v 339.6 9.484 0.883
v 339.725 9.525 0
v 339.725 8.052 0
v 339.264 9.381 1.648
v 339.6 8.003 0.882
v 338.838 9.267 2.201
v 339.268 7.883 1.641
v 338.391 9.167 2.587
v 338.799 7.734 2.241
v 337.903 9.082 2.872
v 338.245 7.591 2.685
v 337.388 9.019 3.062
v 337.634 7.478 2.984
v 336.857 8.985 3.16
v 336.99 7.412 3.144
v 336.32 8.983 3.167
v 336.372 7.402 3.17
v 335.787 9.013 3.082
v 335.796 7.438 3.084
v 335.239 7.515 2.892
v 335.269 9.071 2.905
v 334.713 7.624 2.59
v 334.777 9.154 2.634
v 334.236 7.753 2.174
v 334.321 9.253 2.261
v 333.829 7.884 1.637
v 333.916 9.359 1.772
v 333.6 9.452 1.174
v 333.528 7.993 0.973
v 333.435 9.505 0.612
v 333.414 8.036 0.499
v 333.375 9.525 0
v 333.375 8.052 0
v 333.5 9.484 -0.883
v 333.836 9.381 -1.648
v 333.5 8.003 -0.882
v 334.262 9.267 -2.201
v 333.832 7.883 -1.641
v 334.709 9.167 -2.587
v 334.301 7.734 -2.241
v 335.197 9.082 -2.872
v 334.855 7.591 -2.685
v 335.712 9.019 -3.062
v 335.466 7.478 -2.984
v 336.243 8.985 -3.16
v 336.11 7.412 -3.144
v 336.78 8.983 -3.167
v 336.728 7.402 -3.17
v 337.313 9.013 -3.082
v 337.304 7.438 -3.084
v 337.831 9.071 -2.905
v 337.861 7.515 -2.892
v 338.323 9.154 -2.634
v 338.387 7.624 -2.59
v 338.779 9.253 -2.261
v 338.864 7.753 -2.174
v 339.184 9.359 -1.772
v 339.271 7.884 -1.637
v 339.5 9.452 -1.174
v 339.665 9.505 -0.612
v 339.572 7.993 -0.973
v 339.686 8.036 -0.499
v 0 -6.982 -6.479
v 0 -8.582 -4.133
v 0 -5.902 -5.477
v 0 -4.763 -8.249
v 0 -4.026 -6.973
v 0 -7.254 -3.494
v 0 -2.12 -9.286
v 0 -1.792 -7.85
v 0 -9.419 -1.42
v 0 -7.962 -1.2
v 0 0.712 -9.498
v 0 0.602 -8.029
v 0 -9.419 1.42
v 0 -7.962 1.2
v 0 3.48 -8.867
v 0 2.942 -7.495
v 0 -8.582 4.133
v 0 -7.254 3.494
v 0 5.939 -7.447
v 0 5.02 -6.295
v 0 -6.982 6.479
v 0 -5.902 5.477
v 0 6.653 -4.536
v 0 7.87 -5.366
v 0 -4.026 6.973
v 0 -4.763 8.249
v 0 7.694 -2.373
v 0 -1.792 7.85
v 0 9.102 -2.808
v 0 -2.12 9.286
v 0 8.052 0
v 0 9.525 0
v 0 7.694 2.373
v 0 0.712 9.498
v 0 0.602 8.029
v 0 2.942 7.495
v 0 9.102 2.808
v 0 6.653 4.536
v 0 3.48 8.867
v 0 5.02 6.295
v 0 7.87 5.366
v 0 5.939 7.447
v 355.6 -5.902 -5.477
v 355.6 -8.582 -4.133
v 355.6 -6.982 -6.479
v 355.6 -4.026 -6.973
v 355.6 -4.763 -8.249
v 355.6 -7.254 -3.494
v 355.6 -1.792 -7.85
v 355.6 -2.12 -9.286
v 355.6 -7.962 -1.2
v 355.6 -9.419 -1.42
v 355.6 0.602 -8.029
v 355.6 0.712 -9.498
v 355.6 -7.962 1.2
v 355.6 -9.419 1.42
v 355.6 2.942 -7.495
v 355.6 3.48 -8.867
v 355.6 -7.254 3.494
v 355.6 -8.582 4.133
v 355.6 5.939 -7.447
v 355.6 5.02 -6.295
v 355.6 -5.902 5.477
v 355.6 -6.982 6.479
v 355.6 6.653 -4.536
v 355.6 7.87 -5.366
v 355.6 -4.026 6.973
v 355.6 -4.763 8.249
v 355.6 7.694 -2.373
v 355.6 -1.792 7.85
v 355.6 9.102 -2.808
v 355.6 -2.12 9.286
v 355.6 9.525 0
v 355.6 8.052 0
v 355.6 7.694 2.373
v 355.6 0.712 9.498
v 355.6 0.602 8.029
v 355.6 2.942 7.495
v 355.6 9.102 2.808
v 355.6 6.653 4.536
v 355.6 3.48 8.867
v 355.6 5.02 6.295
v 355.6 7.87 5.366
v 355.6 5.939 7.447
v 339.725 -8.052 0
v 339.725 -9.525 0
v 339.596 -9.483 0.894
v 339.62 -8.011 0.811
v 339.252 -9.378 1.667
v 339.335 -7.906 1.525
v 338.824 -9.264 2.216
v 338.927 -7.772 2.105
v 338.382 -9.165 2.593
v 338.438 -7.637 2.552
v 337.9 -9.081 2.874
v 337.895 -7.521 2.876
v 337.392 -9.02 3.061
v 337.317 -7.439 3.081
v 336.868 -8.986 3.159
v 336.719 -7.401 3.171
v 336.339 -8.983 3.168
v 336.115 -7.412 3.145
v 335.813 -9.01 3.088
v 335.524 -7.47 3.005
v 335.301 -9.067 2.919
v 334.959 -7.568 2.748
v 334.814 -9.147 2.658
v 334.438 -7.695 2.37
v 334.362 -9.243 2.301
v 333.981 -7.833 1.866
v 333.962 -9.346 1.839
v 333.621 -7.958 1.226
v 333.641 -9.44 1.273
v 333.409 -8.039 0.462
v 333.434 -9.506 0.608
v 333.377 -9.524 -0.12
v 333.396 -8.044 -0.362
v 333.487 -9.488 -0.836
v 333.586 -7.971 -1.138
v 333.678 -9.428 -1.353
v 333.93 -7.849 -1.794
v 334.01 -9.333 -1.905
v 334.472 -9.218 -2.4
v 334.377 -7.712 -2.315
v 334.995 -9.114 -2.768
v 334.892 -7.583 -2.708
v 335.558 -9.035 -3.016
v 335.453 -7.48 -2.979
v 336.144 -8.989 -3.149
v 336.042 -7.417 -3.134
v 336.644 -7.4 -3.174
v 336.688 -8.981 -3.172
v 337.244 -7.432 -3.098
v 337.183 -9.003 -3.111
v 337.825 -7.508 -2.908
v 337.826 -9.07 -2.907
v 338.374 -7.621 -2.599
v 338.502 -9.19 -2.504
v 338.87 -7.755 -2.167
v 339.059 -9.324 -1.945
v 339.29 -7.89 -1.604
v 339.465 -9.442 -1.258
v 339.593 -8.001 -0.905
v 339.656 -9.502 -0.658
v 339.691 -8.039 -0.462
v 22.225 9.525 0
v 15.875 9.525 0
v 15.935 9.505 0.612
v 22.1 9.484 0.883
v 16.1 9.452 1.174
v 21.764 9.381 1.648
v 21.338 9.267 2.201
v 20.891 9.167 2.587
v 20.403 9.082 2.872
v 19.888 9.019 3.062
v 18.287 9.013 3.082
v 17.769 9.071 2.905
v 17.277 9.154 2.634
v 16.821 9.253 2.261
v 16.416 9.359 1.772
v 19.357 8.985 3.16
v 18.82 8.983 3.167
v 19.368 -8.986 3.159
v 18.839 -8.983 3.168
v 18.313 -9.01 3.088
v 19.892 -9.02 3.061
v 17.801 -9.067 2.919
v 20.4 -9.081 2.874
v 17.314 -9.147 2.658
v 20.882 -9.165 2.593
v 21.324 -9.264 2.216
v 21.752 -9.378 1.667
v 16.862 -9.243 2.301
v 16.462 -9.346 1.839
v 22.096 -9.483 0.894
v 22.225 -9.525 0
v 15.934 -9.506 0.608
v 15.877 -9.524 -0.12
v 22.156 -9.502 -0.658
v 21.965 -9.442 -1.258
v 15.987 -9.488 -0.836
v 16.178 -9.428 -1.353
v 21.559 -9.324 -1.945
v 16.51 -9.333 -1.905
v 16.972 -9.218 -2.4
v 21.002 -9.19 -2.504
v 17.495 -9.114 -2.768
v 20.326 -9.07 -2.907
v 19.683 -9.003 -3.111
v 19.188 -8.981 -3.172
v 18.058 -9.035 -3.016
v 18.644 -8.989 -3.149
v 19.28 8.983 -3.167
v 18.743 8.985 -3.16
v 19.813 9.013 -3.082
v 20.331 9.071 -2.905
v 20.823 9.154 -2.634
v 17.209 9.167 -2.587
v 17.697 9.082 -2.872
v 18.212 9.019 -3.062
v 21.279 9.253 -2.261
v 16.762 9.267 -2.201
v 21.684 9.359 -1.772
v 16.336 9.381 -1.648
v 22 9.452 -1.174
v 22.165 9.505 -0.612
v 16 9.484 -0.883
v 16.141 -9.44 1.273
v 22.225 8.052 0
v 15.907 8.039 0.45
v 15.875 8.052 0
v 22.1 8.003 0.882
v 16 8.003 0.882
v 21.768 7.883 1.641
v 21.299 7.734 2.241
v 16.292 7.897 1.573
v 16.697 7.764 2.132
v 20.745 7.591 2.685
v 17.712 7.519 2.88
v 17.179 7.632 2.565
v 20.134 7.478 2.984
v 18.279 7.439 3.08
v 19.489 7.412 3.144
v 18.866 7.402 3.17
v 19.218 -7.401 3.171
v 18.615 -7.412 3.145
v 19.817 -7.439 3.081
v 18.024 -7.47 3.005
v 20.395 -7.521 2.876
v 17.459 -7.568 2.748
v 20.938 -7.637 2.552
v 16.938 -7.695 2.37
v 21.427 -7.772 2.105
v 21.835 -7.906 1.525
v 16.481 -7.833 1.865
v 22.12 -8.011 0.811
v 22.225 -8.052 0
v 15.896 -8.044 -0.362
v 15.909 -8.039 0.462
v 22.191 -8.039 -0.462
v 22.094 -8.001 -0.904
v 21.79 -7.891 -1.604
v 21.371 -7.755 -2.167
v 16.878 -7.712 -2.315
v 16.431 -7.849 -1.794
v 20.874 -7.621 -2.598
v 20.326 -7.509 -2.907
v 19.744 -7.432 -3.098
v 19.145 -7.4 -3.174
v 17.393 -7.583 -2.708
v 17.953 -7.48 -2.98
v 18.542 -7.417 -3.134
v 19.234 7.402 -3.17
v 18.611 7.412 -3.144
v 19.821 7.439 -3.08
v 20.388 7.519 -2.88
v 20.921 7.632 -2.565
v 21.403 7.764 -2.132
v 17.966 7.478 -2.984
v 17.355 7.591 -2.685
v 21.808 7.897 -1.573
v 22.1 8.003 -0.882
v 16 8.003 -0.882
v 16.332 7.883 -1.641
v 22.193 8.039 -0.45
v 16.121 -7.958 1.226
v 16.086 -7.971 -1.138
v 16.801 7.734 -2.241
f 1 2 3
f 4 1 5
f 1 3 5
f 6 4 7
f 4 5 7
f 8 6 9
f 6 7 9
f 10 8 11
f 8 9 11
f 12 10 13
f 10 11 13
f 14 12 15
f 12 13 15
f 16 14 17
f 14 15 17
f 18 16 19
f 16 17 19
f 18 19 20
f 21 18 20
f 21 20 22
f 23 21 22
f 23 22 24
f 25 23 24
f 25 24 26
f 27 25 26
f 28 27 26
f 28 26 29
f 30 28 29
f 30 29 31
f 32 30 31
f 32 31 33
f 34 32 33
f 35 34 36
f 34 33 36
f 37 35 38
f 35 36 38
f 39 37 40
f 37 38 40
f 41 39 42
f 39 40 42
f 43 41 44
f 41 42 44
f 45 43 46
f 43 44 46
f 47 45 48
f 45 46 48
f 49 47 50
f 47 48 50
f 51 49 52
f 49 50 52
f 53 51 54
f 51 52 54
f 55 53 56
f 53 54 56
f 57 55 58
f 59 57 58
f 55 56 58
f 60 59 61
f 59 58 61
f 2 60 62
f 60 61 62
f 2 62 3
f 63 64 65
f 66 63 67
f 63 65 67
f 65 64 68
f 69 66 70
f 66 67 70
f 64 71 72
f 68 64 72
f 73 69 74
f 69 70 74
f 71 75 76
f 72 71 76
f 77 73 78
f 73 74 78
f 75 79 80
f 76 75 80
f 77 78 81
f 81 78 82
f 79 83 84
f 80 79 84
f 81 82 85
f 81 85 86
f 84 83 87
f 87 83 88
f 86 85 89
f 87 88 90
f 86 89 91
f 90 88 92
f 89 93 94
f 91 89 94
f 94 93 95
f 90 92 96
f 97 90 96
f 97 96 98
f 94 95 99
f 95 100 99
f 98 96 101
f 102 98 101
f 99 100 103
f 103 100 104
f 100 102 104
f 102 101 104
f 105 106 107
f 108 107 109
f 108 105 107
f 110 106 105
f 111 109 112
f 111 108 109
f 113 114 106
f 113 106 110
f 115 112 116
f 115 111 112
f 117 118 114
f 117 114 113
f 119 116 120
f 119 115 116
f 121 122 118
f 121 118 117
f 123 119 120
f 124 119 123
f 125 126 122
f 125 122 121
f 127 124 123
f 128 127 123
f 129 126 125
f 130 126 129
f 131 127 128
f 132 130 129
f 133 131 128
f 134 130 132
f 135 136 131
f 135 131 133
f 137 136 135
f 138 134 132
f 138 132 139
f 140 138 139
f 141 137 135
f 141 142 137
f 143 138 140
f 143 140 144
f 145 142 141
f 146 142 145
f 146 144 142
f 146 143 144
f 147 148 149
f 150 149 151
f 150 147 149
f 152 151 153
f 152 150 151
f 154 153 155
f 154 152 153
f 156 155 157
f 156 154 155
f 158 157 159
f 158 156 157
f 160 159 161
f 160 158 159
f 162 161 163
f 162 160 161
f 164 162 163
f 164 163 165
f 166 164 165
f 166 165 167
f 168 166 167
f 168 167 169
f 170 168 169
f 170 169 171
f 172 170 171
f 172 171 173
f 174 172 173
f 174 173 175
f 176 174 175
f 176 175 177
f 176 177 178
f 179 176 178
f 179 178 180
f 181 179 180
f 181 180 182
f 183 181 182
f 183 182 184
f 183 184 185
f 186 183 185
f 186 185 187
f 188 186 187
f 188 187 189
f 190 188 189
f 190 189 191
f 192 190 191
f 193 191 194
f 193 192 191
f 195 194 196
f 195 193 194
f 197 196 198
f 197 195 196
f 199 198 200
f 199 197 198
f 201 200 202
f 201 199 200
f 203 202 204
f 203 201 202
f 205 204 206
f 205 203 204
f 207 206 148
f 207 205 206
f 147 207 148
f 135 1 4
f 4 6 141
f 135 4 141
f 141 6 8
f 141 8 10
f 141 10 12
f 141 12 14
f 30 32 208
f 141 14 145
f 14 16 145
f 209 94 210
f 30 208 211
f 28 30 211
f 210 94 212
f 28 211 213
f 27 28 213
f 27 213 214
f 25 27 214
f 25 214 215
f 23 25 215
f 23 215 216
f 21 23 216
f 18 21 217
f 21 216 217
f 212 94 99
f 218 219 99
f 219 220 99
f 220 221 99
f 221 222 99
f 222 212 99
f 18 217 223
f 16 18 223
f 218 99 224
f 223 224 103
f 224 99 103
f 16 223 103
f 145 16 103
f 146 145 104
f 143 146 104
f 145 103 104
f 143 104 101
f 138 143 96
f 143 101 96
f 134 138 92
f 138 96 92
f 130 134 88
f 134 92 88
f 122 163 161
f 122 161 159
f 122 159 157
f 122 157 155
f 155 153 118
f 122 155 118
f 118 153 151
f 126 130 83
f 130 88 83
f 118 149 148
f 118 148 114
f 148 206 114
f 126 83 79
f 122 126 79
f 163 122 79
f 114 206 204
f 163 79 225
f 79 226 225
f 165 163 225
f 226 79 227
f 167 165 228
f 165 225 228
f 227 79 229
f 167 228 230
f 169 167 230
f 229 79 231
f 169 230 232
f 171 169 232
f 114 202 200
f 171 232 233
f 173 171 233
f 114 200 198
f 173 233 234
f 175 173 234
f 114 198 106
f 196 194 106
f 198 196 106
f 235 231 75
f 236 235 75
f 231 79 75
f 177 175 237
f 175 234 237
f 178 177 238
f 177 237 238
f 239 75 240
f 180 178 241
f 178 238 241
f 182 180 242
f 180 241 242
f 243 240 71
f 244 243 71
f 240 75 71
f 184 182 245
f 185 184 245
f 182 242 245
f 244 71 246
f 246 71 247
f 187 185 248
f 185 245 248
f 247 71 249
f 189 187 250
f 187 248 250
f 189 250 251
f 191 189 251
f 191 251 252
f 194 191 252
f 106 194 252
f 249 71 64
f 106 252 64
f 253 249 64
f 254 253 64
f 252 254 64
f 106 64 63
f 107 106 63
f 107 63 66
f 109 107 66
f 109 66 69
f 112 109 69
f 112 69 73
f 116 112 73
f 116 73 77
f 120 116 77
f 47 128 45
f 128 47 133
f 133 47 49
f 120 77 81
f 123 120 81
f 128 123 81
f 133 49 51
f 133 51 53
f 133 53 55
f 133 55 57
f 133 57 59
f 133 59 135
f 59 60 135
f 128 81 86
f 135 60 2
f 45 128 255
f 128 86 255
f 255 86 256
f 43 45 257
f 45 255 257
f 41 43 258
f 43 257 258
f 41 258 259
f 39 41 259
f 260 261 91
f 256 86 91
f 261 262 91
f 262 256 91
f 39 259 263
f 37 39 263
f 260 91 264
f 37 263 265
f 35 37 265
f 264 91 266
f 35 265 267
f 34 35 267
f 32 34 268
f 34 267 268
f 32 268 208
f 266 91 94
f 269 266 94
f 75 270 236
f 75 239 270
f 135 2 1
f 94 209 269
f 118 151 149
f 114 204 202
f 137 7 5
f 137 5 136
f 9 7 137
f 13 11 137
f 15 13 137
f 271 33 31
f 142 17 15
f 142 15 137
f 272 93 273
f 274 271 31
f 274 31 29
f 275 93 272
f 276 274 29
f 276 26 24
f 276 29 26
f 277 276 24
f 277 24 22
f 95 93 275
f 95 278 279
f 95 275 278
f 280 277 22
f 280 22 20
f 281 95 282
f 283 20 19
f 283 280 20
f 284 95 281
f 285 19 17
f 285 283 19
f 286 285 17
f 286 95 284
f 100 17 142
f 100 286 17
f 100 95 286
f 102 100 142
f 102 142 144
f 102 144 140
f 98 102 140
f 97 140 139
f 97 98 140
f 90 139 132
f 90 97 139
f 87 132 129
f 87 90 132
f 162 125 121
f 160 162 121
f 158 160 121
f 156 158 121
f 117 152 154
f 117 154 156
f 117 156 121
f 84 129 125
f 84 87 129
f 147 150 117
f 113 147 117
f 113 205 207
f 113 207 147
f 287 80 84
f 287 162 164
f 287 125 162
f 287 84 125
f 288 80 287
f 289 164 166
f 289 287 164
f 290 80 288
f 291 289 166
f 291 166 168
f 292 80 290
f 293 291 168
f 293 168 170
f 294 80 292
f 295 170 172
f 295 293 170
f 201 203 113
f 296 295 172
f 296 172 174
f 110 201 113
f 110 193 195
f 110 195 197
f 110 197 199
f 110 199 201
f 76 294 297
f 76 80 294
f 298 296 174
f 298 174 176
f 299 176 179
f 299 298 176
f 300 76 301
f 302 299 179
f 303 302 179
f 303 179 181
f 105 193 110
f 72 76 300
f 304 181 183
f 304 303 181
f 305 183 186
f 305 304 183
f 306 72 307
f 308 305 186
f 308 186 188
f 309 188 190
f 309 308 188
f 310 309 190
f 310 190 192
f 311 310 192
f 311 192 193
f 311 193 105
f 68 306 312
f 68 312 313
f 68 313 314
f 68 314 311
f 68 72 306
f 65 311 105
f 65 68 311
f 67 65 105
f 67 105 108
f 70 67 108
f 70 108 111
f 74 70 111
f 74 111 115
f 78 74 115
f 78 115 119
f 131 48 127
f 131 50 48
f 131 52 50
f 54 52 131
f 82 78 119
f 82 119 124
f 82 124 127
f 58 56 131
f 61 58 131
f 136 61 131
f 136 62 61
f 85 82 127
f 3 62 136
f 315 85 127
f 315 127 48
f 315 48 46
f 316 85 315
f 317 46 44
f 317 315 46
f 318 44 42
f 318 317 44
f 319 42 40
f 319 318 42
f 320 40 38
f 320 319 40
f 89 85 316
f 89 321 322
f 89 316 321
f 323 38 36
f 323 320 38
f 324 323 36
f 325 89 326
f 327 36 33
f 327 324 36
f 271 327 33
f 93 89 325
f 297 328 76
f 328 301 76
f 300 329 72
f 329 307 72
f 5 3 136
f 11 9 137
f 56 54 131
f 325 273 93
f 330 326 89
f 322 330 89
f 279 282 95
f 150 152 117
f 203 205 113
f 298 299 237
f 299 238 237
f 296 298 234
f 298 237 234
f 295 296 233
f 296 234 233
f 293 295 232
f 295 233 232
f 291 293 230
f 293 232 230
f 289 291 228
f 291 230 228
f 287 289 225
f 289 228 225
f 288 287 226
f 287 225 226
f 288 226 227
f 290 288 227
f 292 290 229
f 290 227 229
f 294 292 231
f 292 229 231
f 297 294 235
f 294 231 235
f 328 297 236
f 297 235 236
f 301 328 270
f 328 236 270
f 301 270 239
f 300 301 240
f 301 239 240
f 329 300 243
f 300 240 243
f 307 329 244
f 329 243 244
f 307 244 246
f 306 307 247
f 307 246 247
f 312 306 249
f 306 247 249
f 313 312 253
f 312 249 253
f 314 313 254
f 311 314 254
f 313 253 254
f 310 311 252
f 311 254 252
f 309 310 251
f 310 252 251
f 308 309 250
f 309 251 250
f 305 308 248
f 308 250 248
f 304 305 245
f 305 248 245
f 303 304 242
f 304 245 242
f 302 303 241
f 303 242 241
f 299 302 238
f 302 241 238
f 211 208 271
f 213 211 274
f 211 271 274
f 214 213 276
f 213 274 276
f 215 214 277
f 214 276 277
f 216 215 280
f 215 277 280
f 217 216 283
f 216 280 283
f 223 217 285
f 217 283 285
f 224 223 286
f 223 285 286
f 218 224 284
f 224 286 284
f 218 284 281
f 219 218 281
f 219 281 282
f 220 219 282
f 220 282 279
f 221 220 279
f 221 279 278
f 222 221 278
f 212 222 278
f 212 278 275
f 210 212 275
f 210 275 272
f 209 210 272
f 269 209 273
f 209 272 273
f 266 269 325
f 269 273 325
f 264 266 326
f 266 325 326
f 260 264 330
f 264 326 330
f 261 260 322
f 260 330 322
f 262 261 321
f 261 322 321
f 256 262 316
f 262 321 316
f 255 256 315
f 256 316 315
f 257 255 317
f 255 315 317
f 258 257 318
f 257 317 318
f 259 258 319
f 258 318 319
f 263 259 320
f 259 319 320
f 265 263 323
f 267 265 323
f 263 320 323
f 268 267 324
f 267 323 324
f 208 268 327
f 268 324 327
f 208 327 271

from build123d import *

# Parameters (mm, degrees)
F0_R     = 9.525
F0_R_2   = 8.0518
F1_DEPTH = 355.6
F2_R     = 3.175
F3_DEPTH = 38.1


with BuildPart() as f1:
    # F0 (on Right) → F1 (new body)
    with BuildSketch(Plane.YZ):
        Circle(F0_R)
        Circle(F0_R_2, mode=Mode.SUBTRACT)
    extrude(amount=F1_DEPTH)

    # F2 (on Front) → F3 (cut, symmetric)
    with BuildSketch(Plane.XZ):
        with Locations((336.55, 0)):
            Circle(F2_R)
        with Locations((19.05, 0)):
            Circle(F2_R)
    extrude(amount=F3_DEPTH, both=True, mode=Mode.SUBTRACT)


solid = f1.part
